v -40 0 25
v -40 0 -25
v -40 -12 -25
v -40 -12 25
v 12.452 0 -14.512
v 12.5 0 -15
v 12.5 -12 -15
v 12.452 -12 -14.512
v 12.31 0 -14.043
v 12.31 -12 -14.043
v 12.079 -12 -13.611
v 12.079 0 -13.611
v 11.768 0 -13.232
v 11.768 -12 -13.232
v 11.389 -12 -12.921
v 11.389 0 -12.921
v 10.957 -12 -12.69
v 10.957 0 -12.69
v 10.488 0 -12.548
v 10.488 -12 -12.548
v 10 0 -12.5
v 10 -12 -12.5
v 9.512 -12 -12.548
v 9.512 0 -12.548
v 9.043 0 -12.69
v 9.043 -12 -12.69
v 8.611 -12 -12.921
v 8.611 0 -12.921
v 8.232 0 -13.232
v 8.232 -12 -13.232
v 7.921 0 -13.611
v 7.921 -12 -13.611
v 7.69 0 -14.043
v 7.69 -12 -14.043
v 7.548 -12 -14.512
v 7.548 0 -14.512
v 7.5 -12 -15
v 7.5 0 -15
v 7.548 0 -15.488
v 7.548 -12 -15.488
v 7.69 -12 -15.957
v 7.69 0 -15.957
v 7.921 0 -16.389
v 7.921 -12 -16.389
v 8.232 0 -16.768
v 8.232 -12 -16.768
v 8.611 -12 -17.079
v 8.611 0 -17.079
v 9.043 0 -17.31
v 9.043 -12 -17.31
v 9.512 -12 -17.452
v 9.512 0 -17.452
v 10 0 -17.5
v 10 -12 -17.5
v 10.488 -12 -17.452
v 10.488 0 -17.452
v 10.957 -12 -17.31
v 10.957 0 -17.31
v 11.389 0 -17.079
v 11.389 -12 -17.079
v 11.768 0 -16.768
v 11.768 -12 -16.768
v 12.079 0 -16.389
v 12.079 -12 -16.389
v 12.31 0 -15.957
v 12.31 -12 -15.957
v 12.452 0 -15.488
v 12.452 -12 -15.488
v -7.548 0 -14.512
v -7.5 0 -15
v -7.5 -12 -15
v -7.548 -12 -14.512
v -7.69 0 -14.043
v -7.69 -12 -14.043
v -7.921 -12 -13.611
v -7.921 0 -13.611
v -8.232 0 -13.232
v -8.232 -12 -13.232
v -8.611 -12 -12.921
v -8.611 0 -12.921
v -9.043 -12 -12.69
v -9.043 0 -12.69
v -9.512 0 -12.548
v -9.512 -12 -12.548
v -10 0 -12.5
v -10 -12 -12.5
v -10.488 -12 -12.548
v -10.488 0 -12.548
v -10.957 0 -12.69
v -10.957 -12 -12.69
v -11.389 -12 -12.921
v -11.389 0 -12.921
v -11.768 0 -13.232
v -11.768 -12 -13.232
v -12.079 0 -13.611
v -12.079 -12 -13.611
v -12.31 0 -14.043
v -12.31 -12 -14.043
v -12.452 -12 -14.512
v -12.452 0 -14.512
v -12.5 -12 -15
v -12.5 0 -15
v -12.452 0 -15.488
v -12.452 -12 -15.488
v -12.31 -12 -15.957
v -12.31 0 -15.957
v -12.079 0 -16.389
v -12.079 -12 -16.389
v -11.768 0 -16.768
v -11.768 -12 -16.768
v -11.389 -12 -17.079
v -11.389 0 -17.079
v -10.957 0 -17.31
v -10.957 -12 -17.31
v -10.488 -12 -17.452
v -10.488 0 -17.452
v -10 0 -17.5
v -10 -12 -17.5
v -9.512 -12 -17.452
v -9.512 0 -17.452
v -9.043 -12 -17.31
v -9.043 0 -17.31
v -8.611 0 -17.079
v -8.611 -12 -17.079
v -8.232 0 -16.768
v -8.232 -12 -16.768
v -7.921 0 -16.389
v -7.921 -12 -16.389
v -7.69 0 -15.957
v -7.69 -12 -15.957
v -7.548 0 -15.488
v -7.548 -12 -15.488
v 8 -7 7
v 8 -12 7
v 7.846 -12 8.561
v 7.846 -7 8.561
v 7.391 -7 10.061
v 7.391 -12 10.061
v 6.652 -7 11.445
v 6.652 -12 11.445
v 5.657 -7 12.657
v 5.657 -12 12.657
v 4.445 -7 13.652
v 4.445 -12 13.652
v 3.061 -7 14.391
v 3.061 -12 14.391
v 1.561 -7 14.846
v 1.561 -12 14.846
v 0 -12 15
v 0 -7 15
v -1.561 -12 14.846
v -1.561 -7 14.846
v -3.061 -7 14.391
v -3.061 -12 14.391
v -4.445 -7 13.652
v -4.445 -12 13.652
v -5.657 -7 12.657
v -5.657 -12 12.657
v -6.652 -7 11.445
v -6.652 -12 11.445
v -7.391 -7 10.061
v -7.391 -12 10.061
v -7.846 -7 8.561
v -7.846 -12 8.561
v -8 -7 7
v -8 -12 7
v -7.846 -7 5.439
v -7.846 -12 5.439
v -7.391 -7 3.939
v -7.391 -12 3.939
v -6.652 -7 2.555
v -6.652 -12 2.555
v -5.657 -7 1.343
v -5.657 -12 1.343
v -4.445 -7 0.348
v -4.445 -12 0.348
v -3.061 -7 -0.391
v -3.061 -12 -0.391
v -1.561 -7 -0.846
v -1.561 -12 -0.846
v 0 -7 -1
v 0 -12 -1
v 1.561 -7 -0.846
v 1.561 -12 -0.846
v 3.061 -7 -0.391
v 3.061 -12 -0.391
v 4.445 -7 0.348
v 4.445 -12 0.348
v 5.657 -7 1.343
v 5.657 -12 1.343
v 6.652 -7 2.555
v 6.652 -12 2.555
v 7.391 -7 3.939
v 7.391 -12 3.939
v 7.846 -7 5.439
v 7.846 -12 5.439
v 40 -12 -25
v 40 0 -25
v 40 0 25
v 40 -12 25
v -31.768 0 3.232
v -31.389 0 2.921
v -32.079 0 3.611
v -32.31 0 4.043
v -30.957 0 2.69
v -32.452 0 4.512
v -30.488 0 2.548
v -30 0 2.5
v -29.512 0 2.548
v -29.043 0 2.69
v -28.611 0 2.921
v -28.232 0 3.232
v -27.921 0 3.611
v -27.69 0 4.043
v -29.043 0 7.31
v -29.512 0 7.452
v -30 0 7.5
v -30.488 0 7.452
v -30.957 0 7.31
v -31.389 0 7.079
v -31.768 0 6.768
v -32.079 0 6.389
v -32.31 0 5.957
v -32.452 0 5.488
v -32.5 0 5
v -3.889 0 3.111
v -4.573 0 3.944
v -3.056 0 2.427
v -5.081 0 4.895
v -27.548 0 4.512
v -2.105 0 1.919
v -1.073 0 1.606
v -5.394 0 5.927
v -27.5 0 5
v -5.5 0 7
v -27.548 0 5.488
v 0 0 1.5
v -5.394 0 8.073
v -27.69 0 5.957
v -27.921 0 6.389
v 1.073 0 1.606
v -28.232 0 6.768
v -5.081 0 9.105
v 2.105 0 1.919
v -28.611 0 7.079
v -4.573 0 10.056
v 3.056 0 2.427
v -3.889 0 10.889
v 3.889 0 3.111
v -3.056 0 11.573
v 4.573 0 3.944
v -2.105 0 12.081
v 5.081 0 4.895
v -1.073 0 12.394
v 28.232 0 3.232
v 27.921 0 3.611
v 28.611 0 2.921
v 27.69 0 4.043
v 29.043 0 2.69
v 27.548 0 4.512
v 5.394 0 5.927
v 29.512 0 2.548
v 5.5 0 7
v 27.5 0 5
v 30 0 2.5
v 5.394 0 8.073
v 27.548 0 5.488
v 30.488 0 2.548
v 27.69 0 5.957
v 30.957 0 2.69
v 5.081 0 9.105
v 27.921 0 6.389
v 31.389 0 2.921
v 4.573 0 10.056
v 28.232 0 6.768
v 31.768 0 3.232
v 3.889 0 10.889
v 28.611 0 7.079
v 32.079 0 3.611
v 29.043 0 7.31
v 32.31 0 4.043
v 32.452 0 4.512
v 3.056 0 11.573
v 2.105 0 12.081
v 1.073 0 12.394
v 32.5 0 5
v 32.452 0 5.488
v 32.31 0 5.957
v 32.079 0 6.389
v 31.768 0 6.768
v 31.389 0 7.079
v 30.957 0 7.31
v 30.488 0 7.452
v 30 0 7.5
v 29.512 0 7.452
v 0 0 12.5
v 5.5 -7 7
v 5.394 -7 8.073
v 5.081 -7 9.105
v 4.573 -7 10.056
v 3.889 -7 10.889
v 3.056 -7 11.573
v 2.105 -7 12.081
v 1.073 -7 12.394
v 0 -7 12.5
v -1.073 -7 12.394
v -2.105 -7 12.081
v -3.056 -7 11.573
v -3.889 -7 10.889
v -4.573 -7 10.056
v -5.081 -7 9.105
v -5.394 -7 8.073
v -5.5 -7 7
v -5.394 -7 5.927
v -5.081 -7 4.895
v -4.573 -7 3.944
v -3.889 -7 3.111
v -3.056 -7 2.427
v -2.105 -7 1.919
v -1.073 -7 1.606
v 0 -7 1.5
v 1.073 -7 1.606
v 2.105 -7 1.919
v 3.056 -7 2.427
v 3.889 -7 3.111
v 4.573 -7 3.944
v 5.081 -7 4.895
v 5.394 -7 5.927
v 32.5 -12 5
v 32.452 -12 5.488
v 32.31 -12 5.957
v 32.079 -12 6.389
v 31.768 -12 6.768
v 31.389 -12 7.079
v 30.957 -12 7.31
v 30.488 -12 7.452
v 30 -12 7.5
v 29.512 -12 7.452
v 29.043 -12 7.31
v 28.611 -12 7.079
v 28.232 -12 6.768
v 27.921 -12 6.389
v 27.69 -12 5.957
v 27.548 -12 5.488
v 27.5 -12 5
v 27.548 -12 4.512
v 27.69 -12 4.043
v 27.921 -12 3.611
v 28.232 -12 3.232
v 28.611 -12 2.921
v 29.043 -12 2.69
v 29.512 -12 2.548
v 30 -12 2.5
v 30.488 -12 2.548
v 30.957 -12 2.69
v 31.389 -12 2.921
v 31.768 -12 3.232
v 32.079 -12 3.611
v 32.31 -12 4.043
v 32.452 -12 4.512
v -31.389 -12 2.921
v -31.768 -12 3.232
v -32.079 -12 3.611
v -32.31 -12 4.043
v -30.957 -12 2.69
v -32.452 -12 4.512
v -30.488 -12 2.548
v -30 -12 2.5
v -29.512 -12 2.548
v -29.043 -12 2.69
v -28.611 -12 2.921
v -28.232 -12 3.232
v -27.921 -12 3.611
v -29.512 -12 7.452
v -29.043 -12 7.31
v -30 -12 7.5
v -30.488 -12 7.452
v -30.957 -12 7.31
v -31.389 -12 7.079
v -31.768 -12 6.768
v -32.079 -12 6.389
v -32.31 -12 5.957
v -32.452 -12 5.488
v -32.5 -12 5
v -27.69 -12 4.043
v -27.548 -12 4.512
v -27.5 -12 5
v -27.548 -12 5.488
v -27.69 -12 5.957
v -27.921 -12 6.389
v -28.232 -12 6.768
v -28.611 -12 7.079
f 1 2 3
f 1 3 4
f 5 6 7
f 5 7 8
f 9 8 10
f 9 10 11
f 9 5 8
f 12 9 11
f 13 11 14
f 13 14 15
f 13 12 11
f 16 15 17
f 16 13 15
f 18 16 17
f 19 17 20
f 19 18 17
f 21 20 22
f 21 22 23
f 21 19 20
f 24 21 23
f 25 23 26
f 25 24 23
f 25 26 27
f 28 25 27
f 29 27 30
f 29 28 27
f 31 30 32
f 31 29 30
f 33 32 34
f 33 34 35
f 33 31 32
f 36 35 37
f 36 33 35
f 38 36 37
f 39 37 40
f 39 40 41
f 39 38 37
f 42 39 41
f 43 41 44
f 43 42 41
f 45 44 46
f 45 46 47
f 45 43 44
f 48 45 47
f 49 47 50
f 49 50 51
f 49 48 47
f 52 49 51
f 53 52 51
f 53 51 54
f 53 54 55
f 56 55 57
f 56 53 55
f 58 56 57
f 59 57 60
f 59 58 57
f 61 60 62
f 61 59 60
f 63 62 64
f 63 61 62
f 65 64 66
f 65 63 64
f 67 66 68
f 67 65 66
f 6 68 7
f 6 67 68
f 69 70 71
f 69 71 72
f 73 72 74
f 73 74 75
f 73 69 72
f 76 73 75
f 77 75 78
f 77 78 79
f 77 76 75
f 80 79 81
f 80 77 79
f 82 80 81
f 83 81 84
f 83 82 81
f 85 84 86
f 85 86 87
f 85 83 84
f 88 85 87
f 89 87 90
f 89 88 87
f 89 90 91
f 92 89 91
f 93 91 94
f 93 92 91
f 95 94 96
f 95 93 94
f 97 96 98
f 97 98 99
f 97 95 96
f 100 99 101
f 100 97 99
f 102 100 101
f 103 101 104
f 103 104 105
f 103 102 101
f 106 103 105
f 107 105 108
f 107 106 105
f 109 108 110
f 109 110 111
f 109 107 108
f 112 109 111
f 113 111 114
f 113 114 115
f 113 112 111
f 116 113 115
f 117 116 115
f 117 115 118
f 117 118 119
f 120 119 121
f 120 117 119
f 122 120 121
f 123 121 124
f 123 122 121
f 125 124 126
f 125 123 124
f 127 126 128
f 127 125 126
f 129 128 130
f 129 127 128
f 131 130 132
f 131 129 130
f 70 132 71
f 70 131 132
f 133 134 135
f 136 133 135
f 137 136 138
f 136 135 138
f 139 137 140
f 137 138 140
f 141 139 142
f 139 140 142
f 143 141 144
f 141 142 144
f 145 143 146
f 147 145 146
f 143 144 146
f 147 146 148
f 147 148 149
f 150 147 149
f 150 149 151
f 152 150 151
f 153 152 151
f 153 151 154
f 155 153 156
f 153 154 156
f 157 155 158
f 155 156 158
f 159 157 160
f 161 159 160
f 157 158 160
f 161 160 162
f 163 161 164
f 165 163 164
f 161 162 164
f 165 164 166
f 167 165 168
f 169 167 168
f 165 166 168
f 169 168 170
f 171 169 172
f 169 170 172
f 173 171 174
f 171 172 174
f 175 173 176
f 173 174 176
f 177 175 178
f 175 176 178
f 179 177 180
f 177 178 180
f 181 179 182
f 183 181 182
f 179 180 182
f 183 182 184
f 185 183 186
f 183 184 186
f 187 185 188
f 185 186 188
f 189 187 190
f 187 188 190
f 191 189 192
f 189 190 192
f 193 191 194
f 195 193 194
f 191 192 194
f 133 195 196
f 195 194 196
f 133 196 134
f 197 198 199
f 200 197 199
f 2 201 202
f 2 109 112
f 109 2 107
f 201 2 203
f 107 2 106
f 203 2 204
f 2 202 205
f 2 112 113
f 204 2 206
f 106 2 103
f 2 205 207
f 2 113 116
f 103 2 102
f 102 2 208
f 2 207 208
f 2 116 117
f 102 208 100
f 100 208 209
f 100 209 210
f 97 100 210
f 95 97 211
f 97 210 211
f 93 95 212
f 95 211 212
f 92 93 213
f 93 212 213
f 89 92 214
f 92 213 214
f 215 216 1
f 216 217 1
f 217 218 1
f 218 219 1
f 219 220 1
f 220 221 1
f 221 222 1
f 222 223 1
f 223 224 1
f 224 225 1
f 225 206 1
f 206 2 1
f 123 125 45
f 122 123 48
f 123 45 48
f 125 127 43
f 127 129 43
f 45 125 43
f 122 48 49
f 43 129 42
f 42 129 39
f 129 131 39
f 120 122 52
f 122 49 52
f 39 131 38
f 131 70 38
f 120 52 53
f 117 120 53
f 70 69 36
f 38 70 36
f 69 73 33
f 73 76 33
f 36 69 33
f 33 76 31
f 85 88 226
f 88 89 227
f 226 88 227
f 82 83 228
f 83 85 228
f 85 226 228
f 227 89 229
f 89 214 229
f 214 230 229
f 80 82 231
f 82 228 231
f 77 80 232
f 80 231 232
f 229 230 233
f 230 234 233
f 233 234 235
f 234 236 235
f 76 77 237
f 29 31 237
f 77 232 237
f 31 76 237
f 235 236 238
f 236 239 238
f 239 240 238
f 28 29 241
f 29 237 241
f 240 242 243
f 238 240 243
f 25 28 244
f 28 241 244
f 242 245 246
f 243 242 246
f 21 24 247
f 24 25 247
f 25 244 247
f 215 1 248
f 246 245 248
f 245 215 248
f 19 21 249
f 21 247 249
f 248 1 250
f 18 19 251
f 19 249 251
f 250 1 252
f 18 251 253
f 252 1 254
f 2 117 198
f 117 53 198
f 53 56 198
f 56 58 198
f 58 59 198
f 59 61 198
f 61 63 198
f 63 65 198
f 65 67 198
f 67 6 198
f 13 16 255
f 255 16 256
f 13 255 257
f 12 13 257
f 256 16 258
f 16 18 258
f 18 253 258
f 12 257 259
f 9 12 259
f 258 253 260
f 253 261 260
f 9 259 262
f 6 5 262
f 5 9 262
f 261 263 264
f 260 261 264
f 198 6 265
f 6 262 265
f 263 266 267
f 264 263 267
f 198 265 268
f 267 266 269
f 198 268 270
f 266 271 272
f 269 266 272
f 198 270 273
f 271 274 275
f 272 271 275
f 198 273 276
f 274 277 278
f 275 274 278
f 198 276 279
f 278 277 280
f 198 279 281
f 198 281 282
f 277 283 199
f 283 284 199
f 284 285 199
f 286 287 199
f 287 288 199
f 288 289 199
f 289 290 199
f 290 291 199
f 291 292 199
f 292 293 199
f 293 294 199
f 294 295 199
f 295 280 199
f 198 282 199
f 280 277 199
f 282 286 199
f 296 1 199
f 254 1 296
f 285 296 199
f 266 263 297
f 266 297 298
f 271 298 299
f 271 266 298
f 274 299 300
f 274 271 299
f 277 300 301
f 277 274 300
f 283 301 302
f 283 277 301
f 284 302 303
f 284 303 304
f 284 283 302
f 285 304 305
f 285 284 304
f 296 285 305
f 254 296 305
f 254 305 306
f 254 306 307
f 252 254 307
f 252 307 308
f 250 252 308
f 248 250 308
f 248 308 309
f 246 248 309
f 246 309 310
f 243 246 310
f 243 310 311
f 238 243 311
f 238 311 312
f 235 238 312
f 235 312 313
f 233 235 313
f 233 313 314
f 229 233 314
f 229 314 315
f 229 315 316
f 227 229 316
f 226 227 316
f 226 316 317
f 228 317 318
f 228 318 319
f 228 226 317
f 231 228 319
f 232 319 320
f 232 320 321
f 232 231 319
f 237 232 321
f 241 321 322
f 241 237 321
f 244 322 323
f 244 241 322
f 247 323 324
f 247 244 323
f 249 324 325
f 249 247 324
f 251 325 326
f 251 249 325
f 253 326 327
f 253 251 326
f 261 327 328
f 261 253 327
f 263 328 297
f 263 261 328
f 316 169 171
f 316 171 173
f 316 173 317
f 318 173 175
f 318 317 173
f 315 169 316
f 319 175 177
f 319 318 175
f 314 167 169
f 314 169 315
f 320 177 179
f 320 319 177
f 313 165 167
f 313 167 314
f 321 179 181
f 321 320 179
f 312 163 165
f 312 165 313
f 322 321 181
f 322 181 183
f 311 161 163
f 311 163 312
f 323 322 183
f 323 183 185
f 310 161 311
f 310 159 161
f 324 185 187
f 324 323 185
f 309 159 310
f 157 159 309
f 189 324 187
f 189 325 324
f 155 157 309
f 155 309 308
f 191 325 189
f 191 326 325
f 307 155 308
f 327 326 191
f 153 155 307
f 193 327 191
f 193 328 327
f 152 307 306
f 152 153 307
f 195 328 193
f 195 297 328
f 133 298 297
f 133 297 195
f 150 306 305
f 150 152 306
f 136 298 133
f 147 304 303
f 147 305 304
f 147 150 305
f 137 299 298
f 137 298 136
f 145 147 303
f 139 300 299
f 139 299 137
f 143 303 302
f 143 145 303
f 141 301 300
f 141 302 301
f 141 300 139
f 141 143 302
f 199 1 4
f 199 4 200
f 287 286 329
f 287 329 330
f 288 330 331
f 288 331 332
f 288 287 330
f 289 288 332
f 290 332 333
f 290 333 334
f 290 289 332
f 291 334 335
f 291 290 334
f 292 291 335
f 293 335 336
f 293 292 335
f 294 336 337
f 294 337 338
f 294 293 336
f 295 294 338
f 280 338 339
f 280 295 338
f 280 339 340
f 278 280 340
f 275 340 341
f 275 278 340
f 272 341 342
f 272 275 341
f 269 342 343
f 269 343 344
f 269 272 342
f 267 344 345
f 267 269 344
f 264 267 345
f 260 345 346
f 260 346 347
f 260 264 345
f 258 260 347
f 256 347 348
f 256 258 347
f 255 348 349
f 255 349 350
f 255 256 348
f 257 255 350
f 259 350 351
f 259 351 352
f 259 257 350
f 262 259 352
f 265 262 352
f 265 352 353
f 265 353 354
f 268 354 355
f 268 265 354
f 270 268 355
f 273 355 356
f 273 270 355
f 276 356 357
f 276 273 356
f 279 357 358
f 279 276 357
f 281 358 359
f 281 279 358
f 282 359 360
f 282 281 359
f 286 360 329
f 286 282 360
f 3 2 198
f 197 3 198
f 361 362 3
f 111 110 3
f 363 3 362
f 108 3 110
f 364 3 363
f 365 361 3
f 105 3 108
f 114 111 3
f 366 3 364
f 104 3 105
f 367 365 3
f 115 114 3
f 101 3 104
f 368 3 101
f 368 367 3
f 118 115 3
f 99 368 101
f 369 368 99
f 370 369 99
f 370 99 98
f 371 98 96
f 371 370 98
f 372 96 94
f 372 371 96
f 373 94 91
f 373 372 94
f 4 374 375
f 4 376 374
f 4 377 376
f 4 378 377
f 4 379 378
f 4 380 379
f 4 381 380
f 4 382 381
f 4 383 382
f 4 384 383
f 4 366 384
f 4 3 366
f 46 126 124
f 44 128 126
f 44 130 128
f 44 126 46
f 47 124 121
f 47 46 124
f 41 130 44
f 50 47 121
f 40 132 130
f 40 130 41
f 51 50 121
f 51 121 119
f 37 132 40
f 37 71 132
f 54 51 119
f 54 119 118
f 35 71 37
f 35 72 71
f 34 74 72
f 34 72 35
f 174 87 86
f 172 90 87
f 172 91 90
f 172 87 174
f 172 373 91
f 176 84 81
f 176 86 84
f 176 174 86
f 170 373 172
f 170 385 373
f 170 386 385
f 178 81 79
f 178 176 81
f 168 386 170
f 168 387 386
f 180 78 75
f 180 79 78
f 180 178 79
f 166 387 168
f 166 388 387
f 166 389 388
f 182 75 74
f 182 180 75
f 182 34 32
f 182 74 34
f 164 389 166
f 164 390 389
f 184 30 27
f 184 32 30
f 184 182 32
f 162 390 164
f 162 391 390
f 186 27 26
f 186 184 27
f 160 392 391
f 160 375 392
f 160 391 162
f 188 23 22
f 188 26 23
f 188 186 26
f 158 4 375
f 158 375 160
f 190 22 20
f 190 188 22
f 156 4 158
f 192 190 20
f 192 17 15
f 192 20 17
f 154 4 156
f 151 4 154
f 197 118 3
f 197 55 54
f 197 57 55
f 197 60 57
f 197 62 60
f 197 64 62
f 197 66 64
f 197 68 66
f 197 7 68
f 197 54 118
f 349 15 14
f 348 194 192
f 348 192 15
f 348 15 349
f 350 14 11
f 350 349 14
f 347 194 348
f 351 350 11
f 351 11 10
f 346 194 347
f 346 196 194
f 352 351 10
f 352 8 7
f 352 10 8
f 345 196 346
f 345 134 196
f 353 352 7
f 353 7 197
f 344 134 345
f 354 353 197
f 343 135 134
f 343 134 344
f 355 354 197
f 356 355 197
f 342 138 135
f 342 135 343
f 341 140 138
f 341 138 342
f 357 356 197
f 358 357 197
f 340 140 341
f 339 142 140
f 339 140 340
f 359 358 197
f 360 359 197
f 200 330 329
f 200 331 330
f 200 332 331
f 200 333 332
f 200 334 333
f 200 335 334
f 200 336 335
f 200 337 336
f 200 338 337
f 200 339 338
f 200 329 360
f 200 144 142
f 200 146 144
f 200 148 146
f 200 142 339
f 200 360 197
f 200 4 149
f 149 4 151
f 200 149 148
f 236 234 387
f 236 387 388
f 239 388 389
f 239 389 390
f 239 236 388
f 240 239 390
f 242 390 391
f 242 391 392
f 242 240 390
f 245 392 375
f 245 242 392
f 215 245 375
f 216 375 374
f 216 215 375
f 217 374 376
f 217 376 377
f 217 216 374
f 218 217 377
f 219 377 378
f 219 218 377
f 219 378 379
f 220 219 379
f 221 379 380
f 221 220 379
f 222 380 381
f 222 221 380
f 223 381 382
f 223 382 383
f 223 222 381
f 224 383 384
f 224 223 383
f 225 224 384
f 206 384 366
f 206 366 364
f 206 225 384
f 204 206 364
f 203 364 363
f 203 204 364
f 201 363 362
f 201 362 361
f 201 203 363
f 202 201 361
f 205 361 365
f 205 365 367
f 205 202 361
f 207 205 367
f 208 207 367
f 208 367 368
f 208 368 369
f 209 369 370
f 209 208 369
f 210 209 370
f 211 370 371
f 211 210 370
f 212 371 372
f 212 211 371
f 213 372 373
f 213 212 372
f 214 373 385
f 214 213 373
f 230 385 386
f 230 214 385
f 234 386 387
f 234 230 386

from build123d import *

# Parameters (mm, degrees)
F0_W     = 80
F0_H     = 50
F0_R     = 2.5
F0_R_2   = 5.5
F1_DEPTH = 12
F2_R     = 8
F2_R_2   = 5.5
F3_DEPTH = 5


with BuildPart() as f1:
    # F0 (on Front) → F1 (new body)
    with BuildSketch(Plane.XZ):
        Rectangle(F0_W, F0_H)
        with Locations((-10, -15)):
            Circle(F0_R, mode=Mode.SUBTRACT)
        with Locations((10, -15)):
            Circle(F0_R, mode=Mode.SUBTRACT)
        with Locations((-30, 5)):
            Circle(F0_R, mode=Mode.SUBTRACT)
        with Locations((0, 7)):
            Circle(F0_R_2, mode=Mode.SUBTRACT)
        with Locations((30, 5)):
            Circle(F0_R, mode=Mode.SUBTRACT)
    extrude(amount=F1_DEPTH)

    # F2 (on face) → F3 (cut)
    with BuildSketch(Plane.XZ.offset(12)):
        with Locations((0, 7)):
            Circle(F2_R)
        with Locations((0, 7)):
            Circle(F2_R_2, mode=Mode.SUBTRACT)
    extrude(amount=-F3_DEPTH, mode=Mode.SUBTRACT)


solid = f1.part
